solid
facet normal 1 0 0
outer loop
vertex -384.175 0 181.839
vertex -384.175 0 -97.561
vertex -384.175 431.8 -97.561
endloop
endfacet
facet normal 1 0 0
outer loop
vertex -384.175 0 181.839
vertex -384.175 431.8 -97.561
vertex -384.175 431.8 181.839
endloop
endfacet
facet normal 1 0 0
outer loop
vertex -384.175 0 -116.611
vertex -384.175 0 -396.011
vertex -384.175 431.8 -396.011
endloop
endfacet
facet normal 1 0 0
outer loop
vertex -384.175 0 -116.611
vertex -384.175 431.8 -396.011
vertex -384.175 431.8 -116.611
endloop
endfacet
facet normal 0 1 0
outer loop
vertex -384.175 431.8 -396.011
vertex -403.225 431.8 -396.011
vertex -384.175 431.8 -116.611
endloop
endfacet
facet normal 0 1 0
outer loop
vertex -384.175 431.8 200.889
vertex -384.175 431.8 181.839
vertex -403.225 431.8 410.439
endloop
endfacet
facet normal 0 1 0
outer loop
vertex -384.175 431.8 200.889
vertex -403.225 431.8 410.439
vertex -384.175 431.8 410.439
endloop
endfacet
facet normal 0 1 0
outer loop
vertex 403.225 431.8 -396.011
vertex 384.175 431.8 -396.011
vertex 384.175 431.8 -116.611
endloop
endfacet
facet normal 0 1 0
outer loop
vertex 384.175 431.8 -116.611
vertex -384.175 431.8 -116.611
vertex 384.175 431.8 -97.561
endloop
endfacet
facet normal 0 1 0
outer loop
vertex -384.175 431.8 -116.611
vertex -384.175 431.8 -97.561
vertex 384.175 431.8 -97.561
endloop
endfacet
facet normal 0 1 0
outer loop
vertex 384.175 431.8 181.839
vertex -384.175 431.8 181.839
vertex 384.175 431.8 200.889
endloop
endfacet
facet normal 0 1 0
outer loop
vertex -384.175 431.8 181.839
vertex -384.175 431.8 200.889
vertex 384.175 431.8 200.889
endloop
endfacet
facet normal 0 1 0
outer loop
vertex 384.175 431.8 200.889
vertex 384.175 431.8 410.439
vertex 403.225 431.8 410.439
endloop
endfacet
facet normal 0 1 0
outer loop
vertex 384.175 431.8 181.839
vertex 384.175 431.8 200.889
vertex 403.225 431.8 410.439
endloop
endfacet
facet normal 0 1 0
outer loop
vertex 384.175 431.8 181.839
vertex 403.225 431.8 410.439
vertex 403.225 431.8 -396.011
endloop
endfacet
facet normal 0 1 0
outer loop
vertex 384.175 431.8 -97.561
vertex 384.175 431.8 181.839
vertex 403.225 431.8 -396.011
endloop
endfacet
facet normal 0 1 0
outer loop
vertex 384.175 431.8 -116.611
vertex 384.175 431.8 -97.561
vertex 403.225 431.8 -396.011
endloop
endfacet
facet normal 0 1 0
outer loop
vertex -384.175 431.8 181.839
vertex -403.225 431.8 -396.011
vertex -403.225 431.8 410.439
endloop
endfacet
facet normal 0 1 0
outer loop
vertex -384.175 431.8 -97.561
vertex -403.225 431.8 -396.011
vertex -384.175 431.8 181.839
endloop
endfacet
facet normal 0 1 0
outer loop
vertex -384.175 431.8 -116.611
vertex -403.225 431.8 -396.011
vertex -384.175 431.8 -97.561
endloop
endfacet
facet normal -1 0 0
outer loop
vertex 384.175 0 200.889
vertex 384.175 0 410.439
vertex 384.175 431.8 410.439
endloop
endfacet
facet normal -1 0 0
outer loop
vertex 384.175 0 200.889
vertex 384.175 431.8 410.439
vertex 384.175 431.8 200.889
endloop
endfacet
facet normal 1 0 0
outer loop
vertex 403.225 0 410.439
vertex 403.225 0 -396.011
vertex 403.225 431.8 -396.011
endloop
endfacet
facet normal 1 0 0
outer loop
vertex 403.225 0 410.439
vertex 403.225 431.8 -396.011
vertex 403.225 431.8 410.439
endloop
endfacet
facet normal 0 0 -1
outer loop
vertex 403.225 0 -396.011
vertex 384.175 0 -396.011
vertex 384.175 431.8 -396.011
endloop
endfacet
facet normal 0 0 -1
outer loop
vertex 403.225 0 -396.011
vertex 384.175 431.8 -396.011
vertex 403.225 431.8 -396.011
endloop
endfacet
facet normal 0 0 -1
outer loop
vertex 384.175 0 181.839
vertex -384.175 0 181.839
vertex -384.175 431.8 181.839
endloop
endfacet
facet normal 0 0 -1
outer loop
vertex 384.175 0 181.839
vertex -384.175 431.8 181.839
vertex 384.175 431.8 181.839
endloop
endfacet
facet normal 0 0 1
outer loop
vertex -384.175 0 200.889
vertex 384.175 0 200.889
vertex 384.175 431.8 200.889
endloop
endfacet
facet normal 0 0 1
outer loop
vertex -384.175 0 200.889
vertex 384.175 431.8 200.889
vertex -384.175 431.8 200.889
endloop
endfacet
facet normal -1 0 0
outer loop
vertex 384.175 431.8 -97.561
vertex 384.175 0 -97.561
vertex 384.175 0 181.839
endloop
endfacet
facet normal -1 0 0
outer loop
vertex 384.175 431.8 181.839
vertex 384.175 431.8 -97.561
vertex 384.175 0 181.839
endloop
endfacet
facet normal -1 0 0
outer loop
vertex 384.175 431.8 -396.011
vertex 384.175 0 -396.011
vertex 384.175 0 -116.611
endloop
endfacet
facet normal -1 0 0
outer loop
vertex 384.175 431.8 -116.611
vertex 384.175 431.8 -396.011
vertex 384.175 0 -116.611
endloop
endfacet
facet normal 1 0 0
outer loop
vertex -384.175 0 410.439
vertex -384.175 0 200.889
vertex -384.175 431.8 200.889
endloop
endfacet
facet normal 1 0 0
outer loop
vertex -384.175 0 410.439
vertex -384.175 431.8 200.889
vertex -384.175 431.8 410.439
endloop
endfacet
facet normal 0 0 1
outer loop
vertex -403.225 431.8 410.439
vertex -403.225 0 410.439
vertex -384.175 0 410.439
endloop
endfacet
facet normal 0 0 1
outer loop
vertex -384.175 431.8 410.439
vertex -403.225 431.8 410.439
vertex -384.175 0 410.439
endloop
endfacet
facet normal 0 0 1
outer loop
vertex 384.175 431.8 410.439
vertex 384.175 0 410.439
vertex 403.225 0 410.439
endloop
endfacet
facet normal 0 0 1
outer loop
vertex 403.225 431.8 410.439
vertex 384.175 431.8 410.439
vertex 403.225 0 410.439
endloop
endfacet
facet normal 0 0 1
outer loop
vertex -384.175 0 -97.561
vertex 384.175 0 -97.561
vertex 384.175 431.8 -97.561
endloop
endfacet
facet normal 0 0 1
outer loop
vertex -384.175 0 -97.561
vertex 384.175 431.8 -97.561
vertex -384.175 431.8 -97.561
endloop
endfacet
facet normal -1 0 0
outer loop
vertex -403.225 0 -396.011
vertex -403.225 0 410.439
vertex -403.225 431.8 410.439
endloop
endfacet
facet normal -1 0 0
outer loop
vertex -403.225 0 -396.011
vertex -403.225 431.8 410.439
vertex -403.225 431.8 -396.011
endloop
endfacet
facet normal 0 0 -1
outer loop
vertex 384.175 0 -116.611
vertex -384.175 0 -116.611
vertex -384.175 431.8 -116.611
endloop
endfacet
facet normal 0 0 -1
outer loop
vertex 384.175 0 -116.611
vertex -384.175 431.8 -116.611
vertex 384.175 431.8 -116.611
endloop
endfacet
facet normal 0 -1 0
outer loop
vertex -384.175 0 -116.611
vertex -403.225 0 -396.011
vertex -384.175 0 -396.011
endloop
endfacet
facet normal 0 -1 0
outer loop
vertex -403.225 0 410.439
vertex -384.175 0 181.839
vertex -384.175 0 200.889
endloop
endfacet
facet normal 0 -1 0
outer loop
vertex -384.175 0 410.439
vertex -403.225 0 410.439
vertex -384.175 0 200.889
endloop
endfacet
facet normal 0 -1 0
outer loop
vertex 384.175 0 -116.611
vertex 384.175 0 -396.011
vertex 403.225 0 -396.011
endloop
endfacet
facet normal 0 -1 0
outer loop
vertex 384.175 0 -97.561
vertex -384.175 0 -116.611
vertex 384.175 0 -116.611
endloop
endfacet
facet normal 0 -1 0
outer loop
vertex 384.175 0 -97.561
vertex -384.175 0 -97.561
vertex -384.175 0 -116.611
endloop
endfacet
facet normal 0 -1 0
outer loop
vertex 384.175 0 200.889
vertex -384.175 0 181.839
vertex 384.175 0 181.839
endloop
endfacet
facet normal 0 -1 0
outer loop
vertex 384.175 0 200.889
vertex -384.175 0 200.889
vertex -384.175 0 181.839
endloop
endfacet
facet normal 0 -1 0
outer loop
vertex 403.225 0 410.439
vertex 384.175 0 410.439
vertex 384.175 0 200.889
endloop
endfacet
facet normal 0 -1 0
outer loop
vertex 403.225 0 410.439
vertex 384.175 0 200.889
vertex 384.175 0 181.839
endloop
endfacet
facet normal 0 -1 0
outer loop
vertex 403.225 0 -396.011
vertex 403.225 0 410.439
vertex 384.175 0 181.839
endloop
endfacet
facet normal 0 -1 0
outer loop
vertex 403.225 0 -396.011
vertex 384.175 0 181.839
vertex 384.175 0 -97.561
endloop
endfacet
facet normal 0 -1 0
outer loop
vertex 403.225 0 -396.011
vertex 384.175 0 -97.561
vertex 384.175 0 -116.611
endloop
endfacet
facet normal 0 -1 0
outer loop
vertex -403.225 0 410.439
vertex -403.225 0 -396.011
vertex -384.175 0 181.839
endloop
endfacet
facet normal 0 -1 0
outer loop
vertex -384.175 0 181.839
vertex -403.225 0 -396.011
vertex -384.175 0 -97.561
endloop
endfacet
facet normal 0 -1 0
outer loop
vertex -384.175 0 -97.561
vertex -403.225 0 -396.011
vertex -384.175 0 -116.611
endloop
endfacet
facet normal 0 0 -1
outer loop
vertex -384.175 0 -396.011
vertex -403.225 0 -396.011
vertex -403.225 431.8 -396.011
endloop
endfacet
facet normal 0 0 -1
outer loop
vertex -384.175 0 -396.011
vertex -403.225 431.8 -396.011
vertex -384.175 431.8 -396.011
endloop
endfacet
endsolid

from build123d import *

# Parameters (mm, degrees)
F0_W     = 19.05
F0_H     = 19.05
F0_H_2   = 190.5
F0_H_3   = 279.4
F1_DEPTH = 431.8


with BuildPart() as f1:
    # F0 (on Front) → F1 (new body)
    with BuildSketch(Plane.XZ):
        with Locations((-393.7, 400.9142230511)):
            Rectangle(F0_W, F0_H)
        with Locations((-393.7, 296.1392230511)):
            Rectangle(F0_W, F0_H_2)
        with Locations((393.7, 400.9142230511)):
            Rectangle(F0_W, F0_H)
        with Locations((-393.7, 191.3642230511)):
            Rectangle(F0_W, F0_H)
        with Locations((393.7, 296.1392230511)):
            Rectangle(F0_W, F0_H_2)
        Polygon((-162.0973050594, 200.8892230511), (-384.175, 200.8892230511), (-384.175, 181.8392230511), (-162.0973050594, 181.8392230511), (384.175, 181.8392230511), (384.175, 200.8892230511), align=None)
        with Locations((-393.7, 42.1392230511)):
            Rectangle(F0_W, F0_H_3)
        with Locations((393.7, 191.3642230511)):
            Rectangle(F0_W, F0_H)
        with Locations((-393.7, -107.0857769489)):
            Rectangle(F0_W, F0_H)
        with Locations((393.7, 42.1392230511)):
            Rectangle(F0_W, F0_H_3)
        Polygon((-162.0973050594, -97.5607769489), (-384.175, -97.5607769489), (-384.175, -116.6107769489), (-162.0973050594, -116.6107769489), (384.175, -116.6107769489), (384.175, -97.5607769489), align=None)
        with Locations((-393.7, -256.3107769489)):
            Rectangle(F0_W, F0_H_3)
        with Locations((393.7, -107.0857769489)):
            Rectangle(F0_W, F0_H)
        with Locations((393.7, -256.3107769489)):
            Rectangle(F0_W, F0_H_3)
    extrude(amount=-F1_DEPTH)


solid = f1.part
